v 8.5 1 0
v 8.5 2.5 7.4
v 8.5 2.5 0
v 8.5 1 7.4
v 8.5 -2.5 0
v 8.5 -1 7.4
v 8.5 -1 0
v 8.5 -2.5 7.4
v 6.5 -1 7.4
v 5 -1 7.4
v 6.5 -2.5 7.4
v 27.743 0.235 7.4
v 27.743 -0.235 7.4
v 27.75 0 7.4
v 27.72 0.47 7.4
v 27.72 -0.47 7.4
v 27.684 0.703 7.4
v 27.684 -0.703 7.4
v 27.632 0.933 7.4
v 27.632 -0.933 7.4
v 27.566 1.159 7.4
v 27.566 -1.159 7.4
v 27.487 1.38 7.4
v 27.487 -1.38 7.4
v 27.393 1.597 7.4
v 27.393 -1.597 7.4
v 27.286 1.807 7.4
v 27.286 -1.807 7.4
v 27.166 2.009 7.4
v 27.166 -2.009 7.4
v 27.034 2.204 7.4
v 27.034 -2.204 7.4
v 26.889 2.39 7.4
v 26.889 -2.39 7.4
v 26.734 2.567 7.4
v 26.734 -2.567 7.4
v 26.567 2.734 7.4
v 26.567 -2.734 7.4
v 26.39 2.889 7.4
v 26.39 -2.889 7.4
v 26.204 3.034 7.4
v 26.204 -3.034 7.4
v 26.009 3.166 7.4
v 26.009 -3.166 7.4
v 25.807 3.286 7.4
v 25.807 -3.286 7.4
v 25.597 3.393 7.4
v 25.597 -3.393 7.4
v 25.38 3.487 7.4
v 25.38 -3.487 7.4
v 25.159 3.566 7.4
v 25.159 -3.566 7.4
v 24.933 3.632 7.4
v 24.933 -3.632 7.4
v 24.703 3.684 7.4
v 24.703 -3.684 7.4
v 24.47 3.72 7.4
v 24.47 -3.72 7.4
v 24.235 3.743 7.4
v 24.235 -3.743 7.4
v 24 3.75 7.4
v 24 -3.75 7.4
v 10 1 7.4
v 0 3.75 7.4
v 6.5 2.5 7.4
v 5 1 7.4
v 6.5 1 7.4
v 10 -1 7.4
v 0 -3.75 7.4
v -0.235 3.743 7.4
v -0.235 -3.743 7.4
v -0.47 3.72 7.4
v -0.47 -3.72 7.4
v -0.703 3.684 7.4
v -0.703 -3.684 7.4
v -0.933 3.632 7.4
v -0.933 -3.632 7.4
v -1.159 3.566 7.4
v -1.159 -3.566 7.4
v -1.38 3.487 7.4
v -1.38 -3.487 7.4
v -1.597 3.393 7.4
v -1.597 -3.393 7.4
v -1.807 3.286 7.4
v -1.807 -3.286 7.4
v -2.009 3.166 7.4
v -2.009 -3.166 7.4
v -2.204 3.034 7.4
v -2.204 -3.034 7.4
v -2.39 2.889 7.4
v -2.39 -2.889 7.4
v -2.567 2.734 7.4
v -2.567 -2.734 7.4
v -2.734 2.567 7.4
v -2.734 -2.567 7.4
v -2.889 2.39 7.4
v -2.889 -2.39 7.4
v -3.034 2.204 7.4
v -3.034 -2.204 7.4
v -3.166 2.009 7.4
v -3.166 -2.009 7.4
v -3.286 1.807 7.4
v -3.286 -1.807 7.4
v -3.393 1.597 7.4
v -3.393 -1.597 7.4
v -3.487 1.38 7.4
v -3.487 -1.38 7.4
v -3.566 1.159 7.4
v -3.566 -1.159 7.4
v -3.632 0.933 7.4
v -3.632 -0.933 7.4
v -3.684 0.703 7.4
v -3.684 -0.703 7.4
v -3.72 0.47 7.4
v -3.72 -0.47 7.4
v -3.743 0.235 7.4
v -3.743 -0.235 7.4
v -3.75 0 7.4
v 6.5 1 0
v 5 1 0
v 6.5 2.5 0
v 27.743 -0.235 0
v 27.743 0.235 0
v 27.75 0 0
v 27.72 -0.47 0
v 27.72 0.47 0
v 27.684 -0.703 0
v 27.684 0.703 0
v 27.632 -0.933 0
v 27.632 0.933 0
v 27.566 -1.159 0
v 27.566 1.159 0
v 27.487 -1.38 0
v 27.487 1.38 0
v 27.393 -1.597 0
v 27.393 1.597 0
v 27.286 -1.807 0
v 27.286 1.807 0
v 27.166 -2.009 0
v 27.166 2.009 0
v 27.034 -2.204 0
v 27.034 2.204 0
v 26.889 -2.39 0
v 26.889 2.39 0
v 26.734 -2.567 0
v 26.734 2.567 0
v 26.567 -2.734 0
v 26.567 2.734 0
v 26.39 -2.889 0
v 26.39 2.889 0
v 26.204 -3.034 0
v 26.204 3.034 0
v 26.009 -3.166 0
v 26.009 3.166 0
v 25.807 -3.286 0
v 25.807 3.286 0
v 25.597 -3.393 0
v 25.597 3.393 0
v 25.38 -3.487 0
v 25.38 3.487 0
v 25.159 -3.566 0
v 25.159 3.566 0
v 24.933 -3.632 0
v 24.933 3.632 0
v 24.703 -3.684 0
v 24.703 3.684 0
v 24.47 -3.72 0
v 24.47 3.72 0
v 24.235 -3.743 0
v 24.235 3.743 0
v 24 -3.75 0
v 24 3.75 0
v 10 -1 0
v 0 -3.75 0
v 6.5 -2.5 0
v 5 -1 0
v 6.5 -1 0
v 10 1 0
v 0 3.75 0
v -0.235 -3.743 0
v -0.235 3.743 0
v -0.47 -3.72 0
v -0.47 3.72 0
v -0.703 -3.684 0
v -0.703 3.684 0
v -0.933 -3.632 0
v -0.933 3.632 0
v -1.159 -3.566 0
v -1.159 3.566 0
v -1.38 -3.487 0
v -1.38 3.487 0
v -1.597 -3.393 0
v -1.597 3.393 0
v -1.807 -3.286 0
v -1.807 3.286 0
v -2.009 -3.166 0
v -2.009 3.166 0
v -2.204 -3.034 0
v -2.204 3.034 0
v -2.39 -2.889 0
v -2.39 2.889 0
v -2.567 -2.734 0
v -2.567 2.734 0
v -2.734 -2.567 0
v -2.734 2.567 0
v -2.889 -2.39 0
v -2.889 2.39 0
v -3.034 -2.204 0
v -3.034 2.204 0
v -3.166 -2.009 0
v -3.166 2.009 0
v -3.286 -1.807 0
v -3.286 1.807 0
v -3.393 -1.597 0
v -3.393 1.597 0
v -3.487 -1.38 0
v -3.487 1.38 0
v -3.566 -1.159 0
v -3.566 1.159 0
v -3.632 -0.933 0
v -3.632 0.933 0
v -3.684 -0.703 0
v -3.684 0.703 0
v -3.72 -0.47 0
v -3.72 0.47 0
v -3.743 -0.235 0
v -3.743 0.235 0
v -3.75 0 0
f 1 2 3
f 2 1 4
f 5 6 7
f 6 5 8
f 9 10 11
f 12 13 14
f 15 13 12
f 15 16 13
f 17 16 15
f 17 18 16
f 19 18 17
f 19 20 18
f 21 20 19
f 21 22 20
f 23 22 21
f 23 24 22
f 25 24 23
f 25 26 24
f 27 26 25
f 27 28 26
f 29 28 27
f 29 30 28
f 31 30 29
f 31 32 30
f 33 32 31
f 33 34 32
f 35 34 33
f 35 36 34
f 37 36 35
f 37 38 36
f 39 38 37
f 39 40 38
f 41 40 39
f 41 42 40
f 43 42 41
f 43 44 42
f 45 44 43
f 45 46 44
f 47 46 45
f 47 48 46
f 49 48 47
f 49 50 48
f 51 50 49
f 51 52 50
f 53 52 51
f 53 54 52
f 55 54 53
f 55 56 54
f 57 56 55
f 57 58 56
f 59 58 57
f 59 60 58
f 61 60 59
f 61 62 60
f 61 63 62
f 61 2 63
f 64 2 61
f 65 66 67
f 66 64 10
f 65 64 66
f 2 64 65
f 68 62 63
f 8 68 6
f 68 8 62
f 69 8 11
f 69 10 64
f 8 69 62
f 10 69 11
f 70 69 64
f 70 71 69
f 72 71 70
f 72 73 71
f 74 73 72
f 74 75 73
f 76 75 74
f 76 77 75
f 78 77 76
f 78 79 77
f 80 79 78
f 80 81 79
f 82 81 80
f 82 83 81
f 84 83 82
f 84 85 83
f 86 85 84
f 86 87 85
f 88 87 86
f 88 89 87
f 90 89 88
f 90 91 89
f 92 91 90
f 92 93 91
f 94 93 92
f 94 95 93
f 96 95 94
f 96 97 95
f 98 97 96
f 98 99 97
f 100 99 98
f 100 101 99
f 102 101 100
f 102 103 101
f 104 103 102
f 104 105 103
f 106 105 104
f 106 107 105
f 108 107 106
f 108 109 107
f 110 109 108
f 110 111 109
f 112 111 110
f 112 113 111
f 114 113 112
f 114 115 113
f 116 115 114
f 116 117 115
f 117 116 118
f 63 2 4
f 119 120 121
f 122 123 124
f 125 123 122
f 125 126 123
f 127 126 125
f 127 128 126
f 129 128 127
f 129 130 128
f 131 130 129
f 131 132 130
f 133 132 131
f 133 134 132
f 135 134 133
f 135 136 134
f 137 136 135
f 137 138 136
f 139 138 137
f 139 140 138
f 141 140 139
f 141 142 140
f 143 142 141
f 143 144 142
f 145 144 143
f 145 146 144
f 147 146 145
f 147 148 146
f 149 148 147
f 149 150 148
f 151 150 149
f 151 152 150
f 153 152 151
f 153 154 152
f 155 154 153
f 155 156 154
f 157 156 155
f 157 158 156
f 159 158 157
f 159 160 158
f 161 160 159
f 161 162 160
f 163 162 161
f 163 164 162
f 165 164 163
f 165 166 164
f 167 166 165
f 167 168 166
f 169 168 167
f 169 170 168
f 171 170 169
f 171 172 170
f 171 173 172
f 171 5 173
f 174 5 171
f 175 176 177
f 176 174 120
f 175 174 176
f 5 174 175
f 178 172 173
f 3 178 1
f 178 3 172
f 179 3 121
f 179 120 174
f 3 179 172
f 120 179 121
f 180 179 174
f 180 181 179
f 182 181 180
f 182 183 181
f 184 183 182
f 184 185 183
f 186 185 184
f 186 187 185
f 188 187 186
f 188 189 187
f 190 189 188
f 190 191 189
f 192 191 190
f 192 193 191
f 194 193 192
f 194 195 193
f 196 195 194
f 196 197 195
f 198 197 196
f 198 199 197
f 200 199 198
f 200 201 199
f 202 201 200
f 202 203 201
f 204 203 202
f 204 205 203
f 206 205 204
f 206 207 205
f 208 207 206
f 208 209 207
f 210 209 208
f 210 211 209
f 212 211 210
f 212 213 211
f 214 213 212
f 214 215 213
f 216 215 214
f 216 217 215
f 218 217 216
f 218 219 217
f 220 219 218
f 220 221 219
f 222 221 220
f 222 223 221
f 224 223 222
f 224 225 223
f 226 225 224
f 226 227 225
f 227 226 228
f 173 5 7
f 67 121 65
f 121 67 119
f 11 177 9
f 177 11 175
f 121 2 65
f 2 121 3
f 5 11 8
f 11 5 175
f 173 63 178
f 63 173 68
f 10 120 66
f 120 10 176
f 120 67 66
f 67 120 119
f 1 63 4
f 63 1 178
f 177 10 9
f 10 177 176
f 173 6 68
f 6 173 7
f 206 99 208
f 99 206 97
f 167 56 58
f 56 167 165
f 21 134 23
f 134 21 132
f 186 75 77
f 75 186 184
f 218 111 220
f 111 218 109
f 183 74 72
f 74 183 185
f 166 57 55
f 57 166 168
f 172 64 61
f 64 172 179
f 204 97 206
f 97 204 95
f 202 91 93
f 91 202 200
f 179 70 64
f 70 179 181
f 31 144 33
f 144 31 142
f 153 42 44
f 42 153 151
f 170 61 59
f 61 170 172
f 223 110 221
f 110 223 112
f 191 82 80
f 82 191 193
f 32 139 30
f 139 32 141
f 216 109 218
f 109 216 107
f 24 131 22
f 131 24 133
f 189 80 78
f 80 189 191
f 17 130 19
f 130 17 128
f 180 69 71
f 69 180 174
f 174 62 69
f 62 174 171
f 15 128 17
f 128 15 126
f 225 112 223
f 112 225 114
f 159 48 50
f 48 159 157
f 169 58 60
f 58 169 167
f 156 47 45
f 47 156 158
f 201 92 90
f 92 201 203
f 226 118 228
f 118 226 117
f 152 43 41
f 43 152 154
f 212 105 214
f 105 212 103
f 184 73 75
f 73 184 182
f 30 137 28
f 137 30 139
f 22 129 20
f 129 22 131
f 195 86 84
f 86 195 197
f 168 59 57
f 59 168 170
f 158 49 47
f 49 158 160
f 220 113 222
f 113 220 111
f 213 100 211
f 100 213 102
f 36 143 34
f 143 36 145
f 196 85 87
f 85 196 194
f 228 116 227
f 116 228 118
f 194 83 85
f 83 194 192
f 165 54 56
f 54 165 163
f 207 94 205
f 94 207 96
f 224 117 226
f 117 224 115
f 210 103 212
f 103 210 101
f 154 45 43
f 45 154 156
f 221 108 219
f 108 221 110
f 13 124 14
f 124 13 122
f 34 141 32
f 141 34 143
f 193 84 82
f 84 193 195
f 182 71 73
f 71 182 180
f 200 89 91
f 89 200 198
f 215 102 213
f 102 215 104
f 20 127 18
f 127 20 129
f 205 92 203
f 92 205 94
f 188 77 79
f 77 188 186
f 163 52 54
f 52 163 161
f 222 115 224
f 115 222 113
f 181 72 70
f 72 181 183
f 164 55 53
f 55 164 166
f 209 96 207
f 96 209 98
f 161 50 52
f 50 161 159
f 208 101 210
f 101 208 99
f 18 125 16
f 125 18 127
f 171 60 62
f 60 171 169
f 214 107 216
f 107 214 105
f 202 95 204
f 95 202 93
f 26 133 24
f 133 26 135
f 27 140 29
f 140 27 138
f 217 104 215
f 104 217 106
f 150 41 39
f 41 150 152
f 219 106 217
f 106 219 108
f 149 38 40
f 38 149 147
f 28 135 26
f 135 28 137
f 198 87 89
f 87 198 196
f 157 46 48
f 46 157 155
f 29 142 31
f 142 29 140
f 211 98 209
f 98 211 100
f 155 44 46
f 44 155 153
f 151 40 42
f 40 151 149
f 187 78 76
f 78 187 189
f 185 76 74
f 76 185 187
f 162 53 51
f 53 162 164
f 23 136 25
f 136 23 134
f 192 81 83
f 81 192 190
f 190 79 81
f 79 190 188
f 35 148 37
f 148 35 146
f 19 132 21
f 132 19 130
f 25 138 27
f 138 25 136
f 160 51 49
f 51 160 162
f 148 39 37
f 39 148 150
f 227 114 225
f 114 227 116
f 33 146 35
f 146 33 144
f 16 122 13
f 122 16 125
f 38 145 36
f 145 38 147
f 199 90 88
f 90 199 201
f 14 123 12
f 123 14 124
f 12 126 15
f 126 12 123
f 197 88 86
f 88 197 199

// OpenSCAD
//LEGO CORE PARAMETERS

	//X


	//Y
Ly_lego_width_beam = 7.5;

	//Z
Lz_lego_height_beam = 7.4;

	//DRILL
//Lego hole pitch
D_lego_pitch_stud = 8.0;
//Internal hole
D_lego_drill_small = 5.0/2.0;
//Approach hole
D_lego_drill_large = 6.1/2.0;

//size of the axel + shaped drill
D_lego_drill_axel = 2.0;

//D_lego_margin = 0.05;


module body_plate( in_length_stud, in_width_stud )
{
    hull()
	{
        cylinder(r=Ly_lego_width_beam/2, h=Lz_lego_height_beam*in_width_stud,$fn=100);
        
        translate([(in_length_stud-1)*D_lego_pitch_stud, 0, 0]) 
            cylinder(r=Ly_lego_width_beam/2, h=Lz_lego_height_beam*in_width_stud,$fn=100);
    }
}

module prvt_drill_plus()
{
    union()
	{
        translate([-D_lego_drill_axel/2, -D_lego_drill_small, 0]) 
            cube([D_lego_drill_axel, D_lego_drill_small*2, Lz_lego_height_beam]);
        translate([-D_lego_drill_small, -D_lego_drill_axel/2, 0]) 
            cube([D_lego_drill_small*2, D_lego_drill_axel, Lz_lego_height_beam]);
    }
}


module lego_beam( is_pattern )
{
	n_length = len(is_pattern);
	
	translate([0, 0, 0]) 
	difference()
	{
		body_plate(n_length,1);
		for (cnt = [0:n_length-1])
        {
			if (is_pattern[cnt] == "+")
			{
                translate([Ly_lego_width_beam , cnt *D_lego_pitch_stud, 0])
                    prvt_drill_plus();
			}
			else
			{
				//No hole
			}
		}


	}


}



module lego_plate( is_pattern, in_width )
{
	n_length = len(is_pattern);
	body_plate(n_length,in_width);
}

//translate([0,0,+30])
lego_beam("++++");

//translate([0,0,-30])
//lego_plate("oooo", 4);
